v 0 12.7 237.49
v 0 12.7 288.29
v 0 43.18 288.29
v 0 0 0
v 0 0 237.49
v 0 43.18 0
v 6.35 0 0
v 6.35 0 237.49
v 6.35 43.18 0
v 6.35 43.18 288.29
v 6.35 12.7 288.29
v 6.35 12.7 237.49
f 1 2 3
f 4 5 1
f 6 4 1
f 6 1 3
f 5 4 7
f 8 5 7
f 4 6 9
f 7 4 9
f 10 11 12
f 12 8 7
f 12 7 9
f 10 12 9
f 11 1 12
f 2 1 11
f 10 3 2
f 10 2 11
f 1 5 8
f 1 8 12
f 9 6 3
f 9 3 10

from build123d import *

# Parameters (mm, degrees)
SKETCH1_W           = 6.35
SKETCH1_H           = 43.18
BOSS_EXTRUDE1_DEPTH = 288.29
CUT_EXTRUDE1_REACH  = 293.575
SKETCH2_W           = 50.8
SKETCH2_H           = 12.7


with BuildPart() as part:
    # Sketch1 → Boss-Extrude1 (new body)
    with BuildSketch(Plane.XY):
        with Locations((3.175, 21.59)):
            Rectangle(SKETCH1_W, SKETCH1_H)
    extrude(amount=BOSS_EXTRUDE1_DEPTH)

    # Sketch2 → Cut-Extrude1 (cut, up to next)
    with BuildSketch(Plane.ZY, mode=Mode.PRIVATE) as cut_extrude1_sk1:
        with Locations((262.89, 6.35)):
            Rectangle(SKETCH2_W, SKETCH2_H)
    cut_extrude1_tool1 = extrude(cut_extrude1_sk1.sketch, amount=-CUT_EXTRUDE1_REACH, mode=Mode.PRIVATE) & part.part
    add(cut_extrude1_tool1.solids().sort_by_distance((0, 6.35, 262.89))[0], mode=Mode.SUBTRACT)


solid = part.part
